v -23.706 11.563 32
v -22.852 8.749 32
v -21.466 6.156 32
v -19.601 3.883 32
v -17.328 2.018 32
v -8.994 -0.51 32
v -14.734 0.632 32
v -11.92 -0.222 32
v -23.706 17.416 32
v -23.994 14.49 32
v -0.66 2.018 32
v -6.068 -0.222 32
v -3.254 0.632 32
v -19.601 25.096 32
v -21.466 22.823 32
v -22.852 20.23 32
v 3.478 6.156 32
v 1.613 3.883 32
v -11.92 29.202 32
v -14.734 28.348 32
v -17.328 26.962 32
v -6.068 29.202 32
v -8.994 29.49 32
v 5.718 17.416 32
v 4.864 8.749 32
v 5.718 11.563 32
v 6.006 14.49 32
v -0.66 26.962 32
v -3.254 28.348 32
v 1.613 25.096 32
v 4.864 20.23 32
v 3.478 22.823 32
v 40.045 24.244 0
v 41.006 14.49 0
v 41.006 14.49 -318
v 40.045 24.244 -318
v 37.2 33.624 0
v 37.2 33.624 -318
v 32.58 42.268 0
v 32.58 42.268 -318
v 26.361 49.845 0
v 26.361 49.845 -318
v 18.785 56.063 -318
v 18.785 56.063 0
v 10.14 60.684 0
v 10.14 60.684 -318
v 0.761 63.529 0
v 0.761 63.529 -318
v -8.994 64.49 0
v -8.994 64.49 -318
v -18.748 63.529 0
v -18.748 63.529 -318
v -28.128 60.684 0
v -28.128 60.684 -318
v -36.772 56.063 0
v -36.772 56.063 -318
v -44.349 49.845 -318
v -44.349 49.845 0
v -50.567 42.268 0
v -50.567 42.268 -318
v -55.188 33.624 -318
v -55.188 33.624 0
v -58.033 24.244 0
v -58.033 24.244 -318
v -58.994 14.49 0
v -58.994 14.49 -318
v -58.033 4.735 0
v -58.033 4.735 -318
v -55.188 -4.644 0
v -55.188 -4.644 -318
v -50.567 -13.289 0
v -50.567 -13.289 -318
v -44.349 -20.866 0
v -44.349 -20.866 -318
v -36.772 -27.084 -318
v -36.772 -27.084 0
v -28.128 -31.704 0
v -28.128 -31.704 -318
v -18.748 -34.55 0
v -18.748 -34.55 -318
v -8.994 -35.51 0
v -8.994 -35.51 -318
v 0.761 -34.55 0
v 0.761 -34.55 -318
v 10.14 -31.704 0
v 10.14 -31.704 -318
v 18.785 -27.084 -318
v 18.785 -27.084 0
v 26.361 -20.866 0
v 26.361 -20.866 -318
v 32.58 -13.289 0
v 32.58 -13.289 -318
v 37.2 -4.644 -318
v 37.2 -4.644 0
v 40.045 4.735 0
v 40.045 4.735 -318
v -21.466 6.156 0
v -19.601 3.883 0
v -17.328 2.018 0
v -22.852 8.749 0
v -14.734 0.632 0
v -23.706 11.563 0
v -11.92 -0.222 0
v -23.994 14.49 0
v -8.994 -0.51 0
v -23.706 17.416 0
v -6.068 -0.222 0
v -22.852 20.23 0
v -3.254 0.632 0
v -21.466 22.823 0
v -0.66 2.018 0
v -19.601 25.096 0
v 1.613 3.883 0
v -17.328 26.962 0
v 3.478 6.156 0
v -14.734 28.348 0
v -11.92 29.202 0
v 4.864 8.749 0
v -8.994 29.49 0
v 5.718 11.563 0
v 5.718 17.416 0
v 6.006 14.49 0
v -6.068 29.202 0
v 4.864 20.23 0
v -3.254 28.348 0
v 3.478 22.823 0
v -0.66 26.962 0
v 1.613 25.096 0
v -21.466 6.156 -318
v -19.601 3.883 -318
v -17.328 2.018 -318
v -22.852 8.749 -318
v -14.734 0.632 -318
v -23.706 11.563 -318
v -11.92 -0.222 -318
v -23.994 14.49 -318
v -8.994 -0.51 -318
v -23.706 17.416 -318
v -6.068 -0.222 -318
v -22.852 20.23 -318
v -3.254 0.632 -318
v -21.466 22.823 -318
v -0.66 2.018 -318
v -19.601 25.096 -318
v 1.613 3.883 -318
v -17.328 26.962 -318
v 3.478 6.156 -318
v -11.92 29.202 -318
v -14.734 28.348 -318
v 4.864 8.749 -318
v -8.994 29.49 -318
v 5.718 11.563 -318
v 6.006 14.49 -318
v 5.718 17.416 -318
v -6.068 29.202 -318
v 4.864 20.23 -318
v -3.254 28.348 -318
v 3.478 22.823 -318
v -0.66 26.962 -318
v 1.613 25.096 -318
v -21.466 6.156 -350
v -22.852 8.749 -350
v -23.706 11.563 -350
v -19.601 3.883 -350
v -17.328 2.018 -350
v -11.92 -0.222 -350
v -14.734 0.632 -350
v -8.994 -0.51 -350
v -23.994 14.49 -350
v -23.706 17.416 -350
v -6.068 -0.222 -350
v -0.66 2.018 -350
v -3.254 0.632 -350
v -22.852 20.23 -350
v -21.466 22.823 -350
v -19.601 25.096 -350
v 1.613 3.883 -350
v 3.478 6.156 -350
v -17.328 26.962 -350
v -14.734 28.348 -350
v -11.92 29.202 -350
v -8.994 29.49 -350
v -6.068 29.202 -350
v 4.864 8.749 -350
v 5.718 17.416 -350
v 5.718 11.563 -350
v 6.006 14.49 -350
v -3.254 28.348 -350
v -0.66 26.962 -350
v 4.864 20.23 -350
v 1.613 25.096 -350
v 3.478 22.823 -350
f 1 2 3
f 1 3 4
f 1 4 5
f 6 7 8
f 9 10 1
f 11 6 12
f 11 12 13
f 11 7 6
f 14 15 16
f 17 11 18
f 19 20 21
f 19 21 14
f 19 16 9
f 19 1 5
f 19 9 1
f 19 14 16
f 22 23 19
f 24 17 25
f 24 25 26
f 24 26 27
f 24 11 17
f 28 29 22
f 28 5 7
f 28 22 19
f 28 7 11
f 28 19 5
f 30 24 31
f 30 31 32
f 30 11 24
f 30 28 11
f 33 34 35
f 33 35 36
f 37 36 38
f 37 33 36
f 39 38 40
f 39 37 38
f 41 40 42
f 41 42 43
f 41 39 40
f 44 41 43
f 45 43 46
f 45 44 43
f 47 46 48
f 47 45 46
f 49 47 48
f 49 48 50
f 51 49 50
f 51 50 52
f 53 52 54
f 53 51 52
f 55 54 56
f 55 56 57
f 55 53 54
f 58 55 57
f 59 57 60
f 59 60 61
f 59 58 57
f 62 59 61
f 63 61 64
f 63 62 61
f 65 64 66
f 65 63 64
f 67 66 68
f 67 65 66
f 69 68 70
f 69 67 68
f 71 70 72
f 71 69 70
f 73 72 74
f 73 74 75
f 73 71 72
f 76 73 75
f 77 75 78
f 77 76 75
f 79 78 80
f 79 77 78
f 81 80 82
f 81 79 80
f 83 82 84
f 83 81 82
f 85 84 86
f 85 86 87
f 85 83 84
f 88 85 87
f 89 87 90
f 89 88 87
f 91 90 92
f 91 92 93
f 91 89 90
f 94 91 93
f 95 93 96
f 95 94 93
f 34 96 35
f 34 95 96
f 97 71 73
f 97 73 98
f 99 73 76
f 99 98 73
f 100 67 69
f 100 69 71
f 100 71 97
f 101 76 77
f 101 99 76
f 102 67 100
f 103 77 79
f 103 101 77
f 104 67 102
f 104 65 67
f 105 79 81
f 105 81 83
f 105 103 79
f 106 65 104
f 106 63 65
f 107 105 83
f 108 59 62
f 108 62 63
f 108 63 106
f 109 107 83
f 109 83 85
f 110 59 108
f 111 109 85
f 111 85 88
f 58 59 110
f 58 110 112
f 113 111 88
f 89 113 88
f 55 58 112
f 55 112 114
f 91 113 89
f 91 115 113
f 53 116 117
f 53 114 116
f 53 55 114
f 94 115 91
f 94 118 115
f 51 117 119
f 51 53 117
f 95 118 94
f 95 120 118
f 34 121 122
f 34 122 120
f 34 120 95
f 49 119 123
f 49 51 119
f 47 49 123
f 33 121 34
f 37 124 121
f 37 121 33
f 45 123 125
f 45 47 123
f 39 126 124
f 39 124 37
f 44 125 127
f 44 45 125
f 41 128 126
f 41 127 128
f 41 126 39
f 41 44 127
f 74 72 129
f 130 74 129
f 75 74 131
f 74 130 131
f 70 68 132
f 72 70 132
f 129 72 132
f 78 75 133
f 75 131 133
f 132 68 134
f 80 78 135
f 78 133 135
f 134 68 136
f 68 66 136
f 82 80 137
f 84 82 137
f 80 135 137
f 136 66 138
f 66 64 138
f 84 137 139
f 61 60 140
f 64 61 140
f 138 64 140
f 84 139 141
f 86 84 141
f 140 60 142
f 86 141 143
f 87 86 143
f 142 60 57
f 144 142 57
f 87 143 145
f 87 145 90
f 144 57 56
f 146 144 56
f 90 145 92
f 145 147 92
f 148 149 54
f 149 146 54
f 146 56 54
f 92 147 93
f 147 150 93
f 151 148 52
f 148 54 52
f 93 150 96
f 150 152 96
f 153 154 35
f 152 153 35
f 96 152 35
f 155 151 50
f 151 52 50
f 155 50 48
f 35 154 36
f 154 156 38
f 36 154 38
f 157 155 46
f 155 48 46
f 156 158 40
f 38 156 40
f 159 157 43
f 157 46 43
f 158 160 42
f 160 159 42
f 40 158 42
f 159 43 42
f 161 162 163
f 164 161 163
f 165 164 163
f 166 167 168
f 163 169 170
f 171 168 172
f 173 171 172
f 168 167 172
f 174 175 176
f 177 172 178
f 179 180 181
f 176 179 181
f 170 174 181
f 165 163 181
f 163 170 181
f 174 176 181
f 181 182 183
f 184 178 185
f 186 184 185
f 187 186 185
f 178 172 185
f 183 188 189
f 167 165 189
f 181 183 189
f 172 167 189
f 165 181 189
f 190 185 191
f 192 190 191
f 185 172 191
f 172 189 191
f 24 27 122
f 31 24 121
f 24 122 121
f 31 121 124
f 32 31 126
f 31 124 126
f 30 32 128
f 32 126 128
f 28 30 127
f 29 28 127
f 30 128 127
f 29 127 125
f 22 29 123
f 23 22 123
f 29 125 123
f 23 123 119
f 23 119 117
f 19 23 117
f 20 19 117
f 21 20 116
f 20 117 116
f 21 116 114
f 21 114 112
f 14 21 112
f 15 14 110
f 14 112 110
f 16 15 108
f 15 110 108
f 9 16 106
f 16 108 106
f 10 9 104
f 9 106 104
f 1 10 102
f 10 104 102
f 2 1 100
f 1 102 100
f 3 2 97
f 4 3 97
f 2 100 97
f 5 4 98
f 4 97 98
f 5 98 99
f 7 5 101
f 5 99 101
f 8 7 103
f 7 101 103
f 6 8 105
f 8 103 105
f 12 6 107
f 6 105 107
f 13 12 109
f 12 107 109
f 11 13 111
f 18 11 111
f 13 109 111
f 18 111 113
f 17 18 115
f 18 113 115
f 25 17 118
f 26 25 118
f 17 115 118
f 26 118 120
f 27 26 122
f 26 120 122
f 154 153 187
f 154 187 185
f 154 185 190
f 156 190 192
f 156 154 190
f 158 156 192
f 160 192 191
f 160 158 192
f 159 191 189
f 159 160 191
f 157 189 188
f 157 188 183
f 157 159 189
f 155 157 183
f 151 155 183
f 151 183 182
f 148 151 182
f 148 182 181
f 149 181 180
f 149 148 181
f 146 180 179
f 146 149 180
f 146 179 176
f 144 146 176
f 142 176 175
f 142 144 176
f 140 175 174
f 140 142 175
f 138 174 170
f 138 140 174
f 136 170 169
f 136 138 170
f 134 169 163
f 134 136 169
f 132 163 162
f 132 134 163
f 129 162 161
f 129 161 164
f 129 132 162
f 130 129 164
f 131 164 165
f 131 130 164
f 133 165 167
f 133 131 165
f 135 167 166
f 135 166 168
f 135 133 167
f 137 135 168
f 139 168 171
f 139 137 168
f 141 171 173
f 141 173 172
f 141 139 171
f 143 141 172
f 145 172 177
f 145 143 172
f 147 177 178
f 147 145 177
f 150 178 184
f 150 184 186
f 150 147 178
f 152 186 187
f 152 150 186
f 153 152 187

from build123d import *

# Parameters (mm, degrees)
SKETCH1_R           = 50
BOSS_EXTRUDE1_DEPTH = 318
SKETCH2_R           = 15
BOSS_EXTRUDE2_DEPTH = 32


with BuildPart() as part:
    # Sketch1 → Boss-Extrude1 (new body)
    with BuildSketch(Plane.XY):
        with Locations((-8.993956806, 14.489721156)):
            Circle(SKETCH1_R)
    extrude(amount=-BOSS_EXTRUDE1_DEPTH)

    # Sketch2 → Boss-Extrude2 (add)
    with BuildSketch(Plane.XY):
        with Locations((-8.993956806, 14.489721156)):
            Circle(SKETCH2_R)
    boss_extrude2 = extrude(amount=BOSS_EXTRUDE2_DEPTH)

    # Mirror1: Boss-Extrude2 across plane
    add(boss_extrude2.mirror(Plane.XY.offset(-159)))


solid = part.part
